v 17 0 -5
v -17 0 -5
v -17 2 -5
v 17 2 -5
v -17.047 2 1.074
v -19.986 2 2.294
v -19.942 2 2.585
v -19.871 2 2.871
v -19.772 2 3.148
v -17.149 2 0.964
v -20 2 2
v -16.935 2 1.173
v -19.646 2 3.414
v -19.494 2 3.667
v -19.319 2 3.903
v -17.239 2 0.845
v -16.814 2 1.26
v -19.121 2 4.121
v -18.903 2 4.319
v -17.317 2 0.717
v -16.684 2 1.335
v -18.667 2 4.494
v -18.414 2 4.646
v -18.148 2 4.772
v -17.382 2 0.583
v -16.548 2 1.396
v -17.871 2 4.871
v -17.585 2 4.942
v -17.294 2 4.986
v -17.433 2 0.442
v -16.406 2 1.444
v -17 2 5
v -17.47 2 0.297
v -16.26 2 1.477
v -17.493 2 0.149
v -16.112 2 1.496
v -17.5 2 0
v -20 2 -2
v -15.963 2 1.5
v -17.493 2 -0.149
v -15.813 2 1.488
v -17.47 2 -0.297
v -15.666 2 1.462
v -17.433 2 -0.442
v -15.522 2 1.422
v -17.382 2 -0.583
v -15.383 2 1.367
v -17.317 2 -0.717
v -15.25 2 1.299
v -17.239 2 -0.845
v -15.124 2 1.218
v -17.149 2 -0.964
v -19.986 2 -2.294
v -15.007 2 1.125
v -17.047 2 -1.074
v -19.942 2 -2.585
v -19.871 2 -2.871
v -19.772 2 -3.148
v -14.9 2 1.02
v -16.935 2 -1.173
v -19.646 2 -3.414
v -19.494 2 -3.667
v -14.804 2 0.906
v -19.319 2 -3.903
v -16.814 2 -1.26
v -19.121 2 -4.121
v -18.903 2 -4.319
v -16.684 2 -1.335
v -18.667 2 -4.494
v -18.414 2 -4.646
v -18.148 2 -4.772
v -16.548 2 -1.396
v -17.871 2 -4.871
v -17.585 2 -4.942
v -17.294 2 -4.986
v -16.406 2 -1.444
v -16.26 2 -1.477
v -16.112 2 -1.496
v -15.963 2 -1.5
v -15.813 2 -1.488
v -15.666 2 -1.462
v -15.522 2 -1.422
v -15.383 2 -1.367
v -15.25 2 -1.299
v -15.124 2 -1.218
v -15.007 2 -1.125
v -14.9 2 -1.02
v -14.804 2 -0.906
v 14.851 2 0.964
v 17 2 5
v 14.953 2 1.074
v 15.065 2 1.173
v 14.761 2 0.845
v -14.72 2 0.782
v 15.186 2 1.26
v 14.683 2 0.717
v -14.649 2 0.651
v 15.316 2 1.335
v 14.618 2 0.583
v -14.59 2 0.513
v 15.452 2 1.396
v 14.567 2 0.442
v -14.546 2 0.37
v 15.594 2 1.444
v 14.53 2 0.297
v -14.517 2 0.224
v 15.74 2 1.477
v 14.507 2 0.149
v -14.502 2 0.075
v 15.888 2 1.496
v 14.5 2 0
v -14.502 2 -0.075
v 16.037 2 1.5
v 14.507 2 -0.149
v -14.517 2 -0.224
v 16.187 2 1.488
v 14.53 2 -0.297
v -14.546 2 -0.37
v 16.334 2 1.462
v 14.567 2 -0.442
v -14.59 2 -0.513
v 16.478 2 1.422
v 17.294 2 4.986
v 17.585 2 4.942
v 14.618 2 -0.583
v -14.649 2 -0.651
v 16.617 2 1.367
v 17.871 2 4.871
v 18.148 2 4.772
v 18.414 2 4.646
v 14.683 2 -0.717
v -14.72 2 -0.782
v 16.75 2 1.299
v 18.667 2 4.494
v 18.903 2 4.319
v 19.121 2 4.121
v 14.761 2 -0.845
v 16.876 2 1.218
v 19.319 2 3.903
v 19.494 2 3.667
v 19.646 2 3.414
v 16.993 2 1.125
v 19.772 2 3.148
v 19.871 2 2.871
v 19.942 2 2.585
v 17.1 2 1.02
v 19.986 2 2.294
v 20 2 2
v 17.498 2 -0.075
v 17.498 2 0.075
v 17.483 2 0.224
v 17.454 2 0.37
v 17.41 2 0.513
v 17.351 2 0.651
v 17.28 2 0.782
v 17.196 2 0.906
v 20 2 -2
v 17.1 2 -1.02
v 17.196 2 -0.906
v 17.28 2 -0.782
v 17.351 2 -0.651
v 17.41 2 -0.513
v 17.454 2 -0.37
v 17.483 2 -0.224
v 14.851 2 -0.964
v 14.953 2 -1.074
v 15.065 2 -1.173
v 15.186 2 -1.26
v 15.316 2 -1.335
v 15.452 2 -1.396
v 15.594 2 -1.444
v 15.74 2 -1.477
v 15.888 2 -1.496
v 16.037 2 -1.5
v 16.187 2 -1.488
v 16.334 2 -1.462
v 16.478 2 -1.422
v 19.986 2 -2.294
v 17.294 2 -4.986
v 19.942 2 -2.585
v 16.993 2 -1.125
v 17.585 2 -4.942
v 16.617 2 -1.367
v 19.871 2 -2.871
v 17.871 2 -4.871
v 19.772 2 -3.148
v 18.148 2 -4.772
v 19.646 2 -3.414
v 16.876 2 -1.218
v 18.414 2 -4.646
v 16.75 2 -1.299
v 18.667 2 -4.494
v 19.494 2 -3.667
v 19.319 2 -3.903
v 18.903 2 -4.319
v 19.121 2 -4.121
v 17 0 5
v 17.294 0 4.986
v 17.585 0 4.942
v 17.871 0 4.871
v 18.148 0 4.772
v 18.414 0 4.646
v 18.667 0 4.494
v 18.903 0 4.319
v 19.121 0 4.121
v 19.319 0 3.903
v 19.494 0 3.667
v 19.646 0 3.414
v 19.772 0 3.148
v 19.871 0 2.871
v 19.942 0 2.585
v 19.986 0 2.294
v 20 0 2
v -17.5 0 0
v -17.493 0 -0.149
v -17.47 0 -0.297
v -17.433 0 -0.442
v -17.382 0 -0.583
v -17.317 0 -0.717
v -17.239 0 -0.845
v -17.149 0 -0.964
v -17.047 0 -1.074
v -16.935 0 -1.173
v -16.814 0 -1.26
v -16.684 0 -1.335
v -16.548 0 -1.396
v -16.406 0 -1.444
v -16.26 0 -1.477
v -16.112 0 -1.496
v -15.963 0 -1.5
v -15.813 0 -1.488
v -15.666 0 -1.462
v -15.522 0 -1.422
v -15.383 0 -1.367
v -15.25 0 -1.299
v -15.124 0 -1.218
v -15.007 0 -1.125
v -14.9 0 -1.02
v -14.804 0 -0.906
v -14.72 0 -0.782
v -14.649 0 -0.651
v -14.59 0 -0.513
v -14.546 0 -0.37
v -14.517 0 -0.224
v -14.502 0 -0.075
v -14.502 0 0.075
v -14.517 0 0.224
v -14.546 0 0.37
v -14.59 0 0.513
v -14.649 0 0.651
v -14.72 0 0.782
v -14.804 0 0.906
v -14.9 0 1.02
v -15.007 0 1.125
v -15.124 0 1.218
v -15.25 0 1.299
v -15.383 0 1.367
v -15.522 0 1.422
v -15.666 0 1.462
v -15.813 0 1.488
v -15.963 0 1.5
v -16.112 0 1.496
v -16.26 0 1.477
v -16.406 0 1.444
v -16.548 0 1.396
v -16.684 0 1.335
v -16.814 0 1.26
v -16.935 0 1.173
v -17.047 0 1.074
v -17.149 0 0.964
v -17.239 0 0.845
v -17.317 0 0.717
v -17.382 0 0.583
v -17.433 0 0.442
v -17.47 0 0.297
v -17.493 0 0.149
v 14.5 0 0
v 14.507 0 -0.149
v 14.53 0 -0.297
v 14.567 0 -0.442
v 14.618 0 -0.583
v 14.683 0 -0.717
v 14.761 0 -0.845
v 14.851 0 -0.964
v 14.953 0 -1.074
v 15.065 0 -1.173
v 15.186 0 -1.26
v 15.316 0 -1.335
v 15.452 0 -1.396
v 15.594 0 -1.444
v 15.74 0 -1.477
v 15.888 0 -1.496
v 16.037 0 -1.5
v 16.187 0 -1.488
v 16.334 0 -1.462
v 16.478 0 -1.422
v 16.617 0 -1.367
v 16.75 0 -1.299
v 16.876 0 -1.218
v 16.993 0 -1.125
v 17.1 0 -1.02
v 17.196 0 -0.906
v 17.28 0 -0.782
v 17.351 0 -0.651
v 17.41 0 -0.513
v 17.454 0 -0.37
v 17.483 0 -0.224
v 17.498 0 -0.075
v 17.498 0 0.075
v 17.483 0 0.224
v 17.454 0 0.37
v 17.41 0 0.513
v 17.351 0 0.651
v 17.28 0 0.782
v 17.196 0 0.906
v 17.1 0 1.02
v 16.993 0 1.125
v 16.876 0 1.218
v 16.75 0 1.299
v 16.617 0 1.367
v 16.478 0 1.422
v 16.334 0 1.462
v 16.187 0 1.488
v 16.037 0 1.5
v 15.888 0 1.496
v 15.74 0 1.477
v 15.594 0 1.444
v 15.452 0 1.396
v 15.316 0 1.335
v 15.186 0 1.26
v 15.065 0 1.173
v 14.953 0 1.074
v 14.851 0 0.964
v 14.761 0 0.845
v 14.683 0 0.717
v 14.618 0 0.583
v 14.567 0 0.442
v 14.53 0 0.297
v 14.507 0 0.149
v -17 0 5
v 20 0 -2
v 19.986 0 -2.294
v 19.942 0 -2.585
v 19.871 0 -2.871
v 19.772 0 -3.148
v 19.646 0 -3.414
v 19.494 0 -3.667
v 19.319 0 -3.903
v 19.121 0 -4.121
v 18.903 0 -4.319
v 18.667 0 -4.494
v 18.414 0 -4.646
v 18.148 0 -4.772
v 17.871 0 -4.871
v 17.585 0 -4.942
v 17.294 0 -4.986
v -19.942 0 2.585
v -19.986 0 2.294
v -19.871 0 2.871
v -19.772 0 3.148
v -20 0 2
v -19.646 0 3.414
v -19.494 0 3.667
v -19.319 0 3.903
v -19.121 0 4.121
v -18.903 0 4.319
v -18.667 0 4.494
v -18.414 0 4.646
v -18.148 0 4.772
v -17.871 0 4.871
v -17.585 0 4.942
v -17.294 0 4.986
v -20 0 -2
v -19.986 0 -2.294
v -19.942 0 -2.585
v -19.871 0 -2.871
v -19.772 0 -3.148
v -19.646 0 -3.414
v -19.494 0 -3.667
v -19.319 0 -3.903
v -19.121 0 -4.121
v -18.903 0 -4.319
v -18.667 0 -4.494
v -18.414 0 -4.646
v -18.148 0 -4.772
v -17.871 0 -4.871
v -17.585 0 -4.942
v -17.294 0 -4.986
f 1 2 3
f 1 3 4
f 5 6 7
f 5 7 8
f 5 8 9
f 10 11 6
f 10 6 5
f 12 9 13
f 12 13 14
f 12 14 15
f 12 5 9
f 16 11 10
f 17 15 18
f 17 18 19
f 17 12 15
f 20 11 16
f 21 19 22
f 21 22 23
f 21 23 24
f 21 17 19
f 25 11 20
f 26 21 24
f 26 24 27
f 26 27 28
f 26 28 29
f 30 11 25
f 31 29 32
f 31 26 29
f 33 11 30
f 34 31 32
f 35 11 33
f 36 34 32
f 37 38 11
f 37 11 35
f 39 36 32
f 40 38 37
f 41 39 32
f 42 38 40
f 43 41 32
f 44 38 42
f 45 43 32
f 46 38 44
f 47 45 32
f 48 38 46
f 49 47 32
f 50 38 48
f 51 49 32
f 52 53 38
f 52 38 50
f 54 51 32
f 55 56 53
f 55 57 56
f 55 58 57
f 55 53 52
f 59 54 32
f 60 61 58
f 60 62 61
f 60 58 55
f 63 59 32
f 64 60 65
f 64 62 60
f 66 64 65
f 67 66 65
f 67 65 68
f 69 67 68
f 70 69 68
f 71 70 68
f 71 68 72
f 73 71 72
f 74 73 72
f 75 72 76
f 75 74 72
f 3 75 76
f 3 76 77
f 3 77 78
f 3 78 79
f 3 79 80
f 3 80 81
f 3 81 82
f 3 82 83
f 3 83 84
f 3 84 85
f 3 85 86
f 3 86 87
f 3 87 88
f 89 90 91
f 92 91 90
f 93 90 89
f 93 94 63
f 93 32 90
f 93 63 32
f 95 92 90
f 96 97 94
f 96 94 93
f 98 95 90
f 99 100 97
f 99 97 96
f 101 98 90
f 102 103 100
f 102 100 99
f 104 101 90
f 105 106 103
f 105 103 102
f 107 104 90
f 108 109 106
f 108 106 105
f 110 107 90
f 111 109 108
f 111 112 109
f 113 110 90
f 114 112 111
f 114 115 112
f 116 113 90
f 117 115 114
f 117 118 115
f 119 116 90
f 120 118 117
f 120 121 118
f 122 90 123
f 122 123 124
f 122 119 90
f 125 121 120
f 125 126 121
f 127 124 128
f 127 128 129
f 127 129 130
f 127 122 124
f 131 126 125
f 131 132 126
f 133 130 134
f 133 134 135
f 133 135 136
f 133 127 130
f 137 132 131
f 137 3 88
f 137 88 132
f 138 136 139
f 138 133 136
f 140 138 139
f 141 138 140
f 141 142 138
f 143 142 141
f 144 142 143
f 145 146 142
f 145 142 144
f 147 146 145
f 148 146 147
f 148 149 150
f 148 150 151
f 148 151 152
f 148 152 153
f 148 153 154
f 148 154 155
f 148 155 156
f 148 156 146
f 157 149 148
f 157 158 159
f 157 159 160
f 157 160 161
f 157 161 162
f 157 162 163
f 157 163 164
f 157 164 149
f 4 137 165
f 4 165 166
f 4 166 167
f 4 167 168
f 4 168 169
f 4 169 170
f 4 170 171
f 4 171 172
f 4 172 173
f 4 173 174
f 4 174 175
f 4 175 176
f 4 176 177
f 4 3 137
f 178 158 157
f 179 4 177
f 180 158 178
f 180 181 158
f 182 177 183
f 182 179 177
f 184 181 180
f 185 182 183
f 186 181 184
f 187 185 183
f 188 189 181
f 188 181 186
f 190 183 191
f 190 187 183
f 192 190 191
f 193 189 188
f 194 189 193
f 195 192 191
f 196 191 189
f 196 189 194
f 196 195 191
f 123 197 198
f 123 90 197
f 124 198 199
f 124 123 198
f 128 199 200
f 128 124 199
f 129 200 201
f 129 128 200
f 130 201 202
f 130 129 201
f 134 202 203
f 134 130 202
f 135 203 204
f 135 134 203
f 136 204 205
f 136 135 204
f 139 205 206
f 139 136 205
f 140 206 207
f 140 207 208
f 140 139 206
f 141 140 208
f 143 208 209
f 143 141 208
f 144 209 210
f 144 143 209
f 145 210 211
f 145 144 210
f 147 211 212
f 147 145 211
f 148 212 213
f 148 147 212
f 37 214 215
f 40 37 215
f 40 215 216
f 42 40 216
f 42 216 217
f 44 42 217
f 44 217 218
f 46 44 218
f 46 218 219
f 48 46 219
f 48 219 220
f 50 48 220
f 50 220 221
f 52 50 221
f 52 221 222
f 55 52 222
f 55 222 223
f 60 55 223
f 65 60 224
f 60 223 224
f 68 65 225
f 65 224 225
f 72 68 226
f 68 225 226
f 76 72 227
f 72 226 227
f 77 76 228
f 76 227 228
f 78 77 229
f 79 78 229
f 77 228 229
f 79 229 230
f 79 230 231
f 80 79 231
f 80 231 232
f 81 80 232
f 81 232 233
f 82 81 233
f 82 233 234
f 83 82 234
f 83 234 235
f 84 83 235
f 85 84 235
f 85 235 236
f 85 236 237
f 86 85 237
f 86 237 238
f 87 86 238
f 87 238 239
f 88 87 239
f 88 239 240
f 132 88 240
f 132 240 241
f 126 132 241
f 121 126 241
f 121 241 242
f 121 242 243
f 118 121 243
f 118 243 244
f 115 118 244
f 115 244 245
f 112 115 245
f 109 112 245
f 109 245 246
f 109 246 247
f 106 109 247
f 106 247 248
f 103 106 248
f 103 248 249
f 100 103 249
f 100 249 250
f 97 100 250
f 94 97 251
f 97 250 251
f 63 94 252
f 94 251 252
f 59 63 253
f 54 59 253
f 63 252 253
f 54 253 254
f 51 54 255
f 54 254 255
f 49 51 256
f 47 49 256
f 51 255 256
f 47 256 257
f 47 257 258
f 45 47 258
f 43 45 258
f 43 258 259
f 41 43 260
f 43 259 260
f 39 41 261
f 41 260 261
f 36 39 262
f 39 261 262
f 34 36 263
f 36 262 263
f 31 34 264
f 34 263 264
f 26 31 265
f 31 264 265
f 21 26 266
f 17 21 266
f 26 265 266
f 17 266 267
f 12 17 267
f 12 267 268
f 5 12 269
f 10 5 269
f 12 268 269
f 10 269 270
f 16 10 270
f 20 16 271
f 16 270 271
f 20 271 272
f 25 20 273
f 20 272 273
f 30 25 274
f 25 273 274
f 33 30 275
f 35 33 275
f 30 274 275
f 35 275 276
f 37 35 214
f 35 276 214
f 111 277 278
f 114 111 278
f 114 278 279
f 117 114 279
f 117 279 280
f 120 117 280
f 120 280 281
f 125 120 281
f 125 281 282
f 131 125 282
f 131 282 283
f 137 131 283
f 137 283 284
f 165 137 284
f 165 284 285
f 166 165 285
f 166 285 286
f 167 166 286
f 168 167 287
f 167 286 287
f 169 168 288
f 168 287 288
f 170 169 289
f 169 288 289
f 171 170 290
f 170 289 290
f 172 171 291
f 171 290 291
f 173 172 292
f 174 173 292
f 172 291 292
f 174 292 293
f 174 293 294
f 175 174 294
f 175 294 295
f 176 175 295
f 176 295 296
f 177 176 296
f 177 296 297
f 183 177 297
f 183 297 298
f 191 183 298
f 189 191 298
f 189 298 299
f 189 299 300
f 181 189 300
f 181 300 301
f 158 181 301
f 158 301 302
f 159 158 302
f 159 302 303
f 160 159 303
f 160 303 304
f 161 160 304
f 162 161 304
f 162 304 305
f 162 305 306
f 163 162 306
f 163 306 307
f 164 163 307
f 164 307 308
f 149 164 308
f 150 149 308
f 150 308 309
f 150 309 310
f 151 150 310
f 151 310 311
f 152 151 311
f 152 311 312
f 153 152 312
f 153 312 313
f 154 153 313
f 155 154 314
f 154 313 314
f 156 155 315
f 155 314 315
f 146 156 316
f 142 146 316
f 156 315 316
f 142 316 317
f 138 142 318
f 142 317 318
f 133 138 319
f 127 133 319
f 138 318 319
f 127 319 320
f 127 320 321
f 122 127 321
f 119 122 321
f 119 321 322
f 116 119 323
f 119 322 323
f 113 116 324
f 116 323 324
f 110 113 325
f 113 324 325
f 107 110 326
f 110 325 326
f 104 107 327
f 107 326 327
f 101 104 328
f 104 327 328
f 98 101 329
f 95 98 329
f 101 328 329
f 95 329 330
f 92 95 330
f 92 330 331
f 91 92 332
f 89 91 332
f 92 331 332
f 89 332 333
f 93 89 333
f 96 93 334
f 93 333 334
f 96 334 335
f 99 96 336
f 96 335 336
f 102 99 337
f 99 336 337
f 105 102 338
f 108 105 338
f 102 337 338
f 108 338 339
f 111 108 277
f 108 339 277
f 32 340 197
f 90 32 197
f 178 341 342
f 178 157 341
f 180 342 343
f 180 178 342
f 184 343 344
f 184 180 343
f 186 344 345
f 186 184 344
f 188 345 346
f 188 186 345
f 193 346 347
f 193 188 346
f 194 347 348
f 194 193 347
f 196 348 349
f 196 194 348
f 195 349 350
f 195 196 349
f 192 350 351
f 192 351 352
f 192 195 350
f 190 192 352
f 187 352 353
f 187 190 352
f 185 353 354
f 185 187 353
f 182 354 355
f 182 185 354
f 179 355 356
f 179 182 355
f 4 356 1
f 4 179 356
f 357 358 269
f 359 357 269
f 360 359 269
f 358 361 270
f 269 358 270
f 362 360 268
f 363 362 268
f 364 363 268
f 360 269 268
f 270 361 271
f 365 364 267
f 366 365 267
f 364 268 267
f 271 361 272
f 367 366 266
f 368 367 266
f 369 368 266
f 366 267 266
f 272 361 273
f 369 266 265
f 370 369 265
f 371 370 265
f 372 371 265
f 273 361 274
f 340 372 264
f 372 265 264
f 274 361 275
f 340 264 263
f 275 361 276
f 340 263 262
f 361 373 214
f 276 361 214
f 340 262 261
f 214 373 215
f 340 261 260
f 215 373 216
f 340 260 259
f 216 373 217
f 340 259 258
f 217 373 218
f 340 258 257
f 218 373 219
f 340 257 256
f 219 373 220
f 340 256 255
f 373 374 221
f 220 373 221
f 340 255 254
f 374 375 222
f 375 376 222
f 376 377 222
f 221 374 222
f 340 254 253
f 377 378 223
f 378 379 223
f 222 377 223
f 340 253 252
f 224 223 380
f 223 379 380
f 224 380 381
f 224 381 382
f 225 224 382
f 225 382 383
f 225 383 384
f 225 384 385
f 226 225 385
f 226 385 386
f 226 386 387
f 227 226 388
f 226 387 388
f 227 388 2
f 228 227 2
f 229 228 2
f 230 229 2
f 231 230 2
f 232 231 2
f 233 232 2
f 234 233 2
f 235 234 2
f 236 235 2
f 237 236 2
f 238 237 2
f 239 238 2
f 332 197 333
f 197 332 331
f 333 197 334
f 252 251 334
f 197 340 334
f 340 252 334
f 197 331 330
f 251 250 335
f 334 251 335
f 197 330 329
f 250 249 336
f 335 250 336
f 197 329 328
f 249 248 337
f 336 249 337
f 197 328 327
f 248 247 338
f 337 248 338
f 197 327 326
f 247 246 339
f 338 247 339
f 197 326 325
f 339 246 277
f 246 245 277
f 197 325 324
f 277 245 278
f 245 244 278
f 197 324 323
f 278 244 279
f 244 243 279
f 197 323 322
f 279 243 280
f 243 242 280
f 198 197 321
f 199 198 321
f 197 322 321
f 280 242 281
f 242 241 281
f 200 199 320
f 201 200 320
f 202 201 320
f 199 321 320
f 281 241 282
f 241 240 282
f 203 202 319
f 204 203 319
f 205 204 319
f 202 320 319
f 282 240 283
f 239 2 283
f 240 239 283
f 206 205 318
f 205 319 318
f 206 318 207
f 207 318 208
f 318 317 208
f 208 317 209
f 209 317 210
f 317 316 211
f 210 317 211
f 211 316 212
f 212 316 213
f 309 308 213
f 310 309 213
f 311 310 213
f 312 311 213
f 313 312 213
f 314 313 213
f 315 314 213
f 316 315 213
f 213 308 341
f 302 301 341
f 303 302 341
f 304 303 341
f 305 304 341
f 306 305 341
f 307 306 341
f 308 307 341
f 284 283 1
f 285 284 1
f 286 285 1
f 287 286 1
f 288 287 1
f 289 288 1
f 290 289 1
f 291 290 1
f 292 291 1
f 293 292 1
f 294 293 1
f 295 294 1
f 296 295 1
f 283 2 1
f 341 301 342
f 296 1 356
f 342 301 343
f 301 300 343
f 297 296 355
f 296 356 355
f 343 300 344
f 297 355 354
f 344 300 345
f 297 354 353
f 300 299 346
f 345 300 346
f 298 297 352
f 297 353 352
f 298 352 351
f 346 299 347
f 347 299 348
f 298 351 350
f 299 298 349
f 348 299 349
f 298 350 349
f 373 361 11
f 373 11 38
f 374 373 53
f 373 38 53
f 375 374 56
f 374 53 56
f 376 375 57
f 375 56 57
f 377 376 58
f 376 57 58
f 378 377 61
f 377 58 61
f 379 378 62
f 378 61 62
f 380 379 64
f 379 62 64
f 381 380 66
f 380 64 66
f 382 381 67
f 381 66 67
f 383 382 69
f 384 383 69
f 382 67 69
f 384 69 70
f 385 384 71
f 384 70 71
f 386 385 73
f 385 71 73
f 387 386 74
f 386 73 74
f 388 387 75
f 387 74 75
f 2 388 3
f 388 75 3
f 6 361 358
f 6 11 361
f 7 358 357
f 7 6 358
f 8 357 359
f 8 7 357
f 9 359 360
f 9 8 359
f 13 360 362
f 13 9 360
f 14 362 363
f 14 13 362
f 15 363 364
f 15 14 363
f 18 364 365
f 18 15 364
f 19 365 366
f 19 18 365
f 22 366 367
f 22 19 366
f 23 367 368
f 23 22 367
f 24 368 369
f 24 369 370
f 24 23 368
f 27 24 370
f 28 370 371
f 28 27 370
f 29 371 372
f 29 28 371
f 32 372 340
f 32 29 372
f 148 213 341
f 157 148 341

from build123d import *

# Parameters (mm, degrees)
SKETCH1_W             = 40
SKETCH1_H             = 10
BOSS_EXTRUDE1_DEPTH   = 2
FILLET1_R             = 3
F_3_0MM_DOWEL_HOLE1_D = 3


with BuildPart() as part:
    # Sketch1 → Boss-Extrude1 (new body)
    with BuildSketch(Plane(origin=(0, 0, 0), x_dir=(1, 0, 0), z_dir=(0, 1, 0))):
        Rectangle(SKETCH1_W, SKETCH1_H)
    extrude(amount=BOSS_EXTRUDE1_DEPTH)

    # Fillet1
    fillet1_edges = [part.edges().sort_by_distance(p)[0] for p in [
        (20, 1, 5),
        (-20, 1, 5),
        (-20, 1, -5),
        (20, 1, -5),
    ]]
    fillet(fillet1_edges, radius=FILLET1_R)

    # Ø3.0mm Dowel Hole1 (through all)
    with Locations(Plane(origin=(0, 2, 0), x_dir=(1, 0, 0), z_dir=(0, 1, 0))):
        with Locations((16, 0), (-16, 0)):
            Hole(F_3_0MM_DOWEL_HOLE1_D / 2)


solid = part.part
